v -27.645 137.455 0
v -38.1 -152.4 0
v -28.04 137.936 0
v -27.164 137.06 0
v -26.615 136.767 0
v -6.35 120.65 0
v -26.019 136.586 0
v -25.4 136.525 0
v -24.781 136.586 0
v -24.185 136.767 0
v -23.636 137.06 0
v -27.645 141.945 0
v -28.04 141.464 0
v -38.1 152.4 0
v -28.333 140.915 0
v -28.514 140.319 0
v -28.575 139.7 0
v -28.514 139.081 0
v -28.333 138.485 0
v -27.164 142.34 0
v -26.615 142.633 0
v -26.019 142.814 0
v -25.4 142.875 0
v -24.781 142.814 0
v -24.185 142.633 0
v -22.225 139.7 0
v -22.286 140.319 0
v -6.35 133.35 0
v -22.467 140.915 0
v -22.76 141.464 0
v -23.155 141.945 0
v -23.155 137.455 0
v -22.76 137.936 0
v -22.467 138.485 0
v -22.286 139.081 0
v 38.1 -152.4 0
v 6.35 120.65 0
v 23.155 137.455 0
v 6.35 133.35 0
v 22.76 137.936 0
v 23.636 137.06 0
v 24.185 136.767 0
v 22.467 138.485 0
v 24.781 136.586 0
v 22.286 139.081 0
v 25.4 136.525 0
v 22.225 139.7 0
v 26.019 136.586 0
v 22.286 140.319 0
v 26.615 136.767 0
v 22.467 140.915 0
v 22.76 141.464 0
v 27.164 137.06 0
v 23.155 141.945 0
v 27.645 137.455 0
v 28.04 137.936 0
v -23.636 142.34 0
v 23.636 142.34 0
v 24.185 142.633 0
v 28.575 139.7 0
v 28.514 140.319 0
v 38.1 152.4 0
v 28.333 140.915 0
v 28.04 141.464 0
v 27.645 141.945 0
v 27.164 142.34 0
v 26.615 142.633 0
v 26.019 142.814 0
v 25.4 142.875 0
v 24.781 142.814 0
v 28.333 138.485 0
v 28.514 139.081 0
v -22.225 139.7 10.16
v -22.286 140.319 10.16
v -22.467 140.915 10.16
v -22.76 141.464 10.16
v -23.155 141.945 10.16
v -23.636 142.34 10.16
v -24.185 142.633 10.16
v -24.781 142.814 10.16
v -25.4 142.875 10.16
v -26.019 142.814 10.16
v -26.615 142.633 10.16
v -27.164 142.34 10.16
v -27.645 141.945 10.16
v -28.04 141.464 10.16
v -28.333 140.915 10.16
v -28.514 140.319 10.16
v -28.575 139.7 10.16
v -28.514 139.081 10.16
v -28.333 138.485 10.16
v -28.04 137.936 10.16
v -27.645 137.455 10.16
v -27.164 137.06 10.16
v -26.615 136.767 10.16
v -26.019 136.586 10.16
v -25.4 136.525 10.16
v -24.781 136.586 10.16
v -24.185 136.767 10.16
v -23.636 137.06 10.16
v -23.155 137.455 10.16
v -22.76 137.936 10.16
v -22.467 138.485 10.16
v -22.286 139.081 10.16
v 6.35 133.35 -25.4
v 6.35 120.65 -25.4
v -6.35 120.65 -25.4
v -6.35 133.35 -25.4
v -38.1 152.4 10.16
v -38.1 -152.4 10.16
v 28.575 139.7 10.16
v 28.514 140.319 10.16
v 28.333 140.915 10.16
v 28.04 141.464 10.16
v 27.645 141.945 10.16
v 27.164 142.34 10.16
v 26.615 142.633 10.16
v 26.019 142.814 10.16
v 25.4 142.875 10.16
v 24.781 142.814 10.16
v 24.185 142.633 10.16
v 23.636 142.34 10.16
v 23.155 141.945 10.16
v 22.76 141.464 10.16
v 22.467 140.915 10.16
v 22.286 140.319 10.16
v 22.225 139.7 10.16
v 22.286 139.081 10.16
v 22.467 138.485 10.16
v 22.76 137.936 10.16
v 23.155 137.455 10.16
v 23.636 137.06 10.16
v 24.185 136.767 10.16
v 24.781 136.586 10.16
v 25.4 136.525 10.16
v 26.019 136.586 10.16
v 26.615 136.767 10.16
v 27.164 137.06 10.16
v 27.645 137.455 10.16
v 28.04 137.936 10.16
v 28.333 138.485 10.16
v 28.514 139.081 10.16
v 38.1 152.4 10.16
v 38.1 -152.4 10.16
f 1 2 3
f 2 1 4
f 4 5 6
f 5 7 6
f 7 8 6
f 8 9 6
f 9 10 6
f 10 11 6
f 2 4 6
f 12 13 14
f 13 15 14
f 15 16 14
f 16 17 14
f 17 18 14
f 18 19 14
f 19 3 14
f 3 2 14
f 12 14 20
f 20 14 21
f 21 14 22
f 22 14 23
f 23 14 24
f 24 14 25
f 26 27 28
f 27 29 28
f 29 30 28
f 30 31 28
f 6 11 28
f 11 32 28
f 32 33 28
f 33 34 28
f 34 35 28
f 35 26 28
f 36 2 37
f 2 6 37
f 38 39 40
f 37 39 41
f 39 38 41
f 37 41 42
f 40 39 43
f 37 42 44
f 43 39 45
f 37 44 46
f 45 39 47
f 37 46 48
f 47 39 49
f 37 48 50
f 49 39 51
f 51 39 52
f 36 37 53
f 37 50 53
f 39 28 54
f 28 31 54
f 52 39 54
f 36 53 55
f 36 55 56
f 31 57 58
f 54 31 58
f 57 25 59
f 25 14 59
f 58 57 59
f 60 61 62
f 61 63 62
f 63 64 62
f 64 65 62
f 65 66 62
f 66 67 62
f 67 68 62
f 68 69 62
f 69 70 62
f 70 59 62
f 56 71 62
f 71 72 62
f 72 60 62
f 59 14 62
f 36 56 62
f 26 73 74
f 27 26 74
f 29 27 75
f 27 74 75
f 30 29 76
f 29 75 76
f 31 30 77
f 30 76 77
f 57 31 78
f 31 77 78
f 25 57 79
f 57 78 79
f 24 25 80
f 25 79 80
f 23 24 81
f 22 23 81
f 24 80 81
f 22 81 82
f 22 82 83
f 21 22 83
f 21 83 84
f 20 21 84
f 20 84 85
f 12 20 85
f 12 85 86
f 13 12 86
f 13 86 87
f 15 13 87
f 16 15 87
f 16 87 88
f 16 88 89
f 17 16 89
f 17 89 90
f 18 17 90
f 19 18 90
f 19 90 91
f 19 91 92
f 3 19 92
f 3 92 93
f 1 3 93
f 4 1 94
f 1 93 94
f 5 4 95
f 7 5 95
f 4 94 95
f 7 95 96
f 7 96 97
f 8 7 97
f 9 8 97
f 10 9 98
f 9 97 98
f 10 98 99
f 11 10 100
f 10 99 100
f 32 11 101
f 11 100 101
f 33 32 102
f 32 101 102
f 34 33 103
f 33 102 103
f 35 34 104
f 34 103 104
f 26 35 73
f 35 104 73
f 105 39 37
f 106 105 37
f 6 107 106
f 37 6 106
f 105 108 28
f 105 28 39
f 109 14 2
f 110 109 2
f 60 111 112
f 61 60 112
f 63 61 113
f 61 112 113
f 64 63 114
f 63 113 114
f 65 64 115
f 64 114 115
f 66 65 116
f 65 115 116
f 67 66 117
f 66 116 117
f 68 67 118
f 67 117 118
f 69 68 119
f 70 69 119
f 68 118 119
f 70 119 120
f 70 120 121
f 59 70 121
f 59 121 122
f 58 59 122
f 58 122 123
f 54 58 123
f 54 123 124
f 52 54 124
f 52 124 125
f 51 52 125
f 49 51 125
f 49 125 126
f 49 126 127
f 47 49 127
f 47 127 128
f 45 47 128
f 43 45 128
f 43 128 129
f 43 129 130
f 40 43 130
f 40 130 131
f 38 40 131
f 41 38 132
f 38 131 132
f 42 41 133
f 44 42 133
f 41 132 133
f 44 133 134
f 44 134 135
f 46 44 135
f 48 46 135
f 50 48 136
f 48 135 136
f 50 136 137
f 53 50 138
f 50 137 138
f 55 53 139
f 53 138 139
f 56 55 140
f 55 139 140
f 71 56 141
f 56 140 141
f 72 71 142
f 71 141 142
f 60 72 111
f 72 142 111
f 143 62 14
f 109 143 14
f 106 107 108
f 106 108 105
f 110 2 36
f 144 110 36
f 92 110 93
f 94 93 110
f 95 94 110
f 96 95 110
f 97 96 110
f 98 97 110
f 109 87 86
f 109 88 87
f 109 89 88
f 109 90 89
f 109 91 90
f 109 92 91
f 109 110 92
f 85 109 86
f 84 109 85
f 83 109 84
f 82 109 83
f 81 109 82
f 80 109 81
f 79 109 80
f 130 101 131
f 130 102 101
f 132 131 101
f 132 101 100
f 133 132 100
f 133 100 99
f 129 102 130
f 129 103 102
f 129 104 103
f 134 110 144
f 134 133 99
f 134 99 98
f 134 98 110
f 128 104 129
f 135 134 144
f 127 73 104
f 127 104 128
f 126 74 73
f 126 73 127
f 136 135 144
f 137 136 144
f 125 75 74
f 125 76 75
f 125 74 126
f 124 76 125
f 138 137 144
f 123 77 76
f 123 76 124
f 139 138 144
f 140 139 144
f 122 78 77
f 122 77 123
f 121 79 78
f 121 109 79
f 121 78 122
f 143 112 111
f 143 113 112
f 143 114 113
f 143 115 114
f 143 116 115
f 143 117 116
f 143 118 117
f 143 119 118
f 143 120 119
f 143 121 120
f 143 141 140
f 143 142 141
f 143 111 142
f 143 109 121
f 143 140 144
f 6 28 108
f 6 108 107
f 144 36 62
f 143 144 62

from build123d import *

# Parameters (mm, degrees)
F1_DEPTH = 10.16
F2_R     = 3.175
F3_DEPTH = 25.4
F4_W     = 12.7
F4_H     = 12.7
F5_DEPTH = 25.4


with BuildPart() as f1:
    # F0 (on Top) → F1 (new body)
    with BuildSketch(Plane.XY):
        Polygon((-38.1, 152.4), (-38.1, -76.2), (-38.1, -152.4), (38.1, -152.4), (38.1, -76.2), (38.1, 152.4), align=None)
    extrude(amount=F1_DEPTH)

    # F2 (on face) → F3 (cut)
    with BuildSketch(Plane.XY.offset(10.16)):
        with Locations((25.4, 139.7)):
            Circle(F2_R)
        with Locations((-25.4, 139.7)):
            Circle(F2_R)
    extrude(amount=-F3_DEPTH, mode=Mode.SUBTRACT)

    # F4 (on face) → F5 (join)
    with BuildSketch(Plane(origin=(0, 0, 0), x_dir=(1, 0, 0), z_dir=(0, 0, -1))):
        with Locations((0, -127)):
            Rectangle(F4_W, F4_H)
    extrude(amount=F5_DEPTH)


solid = f1.part
